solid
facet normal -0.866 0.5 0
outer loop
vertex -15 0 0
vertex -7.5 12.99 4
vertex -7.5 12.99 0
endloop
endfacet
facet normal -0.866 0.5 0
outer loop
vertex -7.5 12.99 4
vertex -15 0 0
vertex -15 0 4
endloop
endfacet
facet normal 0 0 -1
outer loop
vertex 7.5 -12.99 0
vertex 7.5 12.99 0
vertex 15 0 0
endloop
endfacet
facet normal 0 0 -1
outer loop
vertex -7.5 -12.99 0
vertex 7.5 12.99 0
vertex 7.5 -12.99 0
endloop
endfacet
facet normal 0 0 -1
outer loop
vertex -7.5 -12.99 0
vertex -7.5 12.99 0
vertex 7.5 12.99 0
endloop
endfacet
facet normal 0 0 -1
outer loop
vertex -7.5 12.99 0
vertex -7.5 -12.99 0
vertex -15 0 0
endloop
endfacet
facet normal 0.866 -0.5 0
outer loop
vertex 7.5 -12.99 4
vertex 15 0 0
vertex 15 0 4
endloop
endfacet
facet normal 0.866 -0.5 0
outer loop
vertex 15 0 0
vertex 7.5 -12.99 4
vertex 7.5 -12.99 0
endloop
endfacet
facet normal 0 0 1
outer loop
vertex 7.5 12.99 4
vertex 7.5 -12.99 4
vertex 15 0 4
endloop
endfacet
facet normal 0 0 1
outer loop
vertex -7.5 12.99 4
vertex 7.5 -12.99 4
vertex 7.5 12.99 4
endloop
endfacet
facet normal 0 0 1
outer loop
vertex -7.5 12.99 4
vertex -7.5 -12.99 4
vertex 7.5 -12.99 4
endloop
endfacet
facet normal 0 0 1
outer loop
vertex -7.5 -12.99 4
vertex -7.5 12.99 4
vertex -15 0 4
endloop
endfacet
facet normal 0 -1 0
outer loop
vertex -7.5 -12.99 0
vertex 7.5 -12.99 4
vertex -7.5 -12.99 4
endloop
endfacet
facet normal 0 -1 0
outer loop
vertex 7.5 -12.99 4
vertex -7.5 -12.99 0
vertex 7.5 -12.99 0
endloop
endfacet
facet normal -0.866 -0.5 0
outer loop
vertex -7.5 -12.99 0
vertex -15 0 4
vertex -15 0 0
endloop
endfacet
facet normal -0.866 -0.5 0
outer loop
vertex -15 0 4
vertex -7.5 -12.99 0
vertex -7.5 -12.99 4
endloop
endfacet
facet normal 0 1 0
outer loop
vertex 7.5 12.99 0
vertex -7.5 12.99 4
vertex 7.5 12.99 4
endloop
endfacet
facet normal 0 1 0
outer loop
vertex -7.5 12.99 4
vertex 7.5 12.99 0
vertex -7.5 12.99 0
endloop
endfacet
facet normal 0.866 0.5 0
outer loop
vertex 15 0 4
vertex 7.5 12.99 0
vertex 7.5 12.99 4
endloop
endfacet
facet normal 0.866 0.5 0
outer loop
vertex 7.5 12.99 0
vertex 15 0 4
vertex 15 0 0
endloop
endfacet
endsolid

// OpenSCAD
// resolution bezier curve
deltat = 0.02;

// cubic bexier curve function
function cubic_bezier(p0,p1,p2,p3) = [for (t=[0:deltat:1+deltat]) pow(1-t,3)*p0+3*pow((1-t),2)*t*p1+3*(1-t)*pow(t,2)*p2+pow(t,3)*p3];
    
function reverse(v) = [for (i=[len(v)-1:-1:0]) v[i]];
function delete_first(v) = [for (i=[1:len(v)-1]) v[i]]; 


p10 = [-4.75,4.001];
p11 = [-2.75,4.0];
p12 = [-4.8,2.2];
p13 = [0.0,2.0];

p20 = [4.75,4.001];
p21 = [2.75,4.0];
p22 = [4.8,2.2];
p23 = [0.0,2.0];



// bezier curve for cx
points_left = cubic_bezier(p10, p11, p12, p13);
points_right = reverse(cubic_bezier(p20, p21, p22, p23));
points = concat(points_left, points_right);


difference()
{
    color("Peru", 1.0)
    {
        // hexagon base
        linear_extrude(height = 4, center = false, convexity = 10, twist = 0)
        circle(r=15, $fn=6);
    }
    
    color("Blue", 1.0)
    {
        // canal shape
        rotate([90,0,0])
        linear_extrude(height=30, center=true, convexity = 10, twist = 0)
        polygon(points);
    }
    
}
